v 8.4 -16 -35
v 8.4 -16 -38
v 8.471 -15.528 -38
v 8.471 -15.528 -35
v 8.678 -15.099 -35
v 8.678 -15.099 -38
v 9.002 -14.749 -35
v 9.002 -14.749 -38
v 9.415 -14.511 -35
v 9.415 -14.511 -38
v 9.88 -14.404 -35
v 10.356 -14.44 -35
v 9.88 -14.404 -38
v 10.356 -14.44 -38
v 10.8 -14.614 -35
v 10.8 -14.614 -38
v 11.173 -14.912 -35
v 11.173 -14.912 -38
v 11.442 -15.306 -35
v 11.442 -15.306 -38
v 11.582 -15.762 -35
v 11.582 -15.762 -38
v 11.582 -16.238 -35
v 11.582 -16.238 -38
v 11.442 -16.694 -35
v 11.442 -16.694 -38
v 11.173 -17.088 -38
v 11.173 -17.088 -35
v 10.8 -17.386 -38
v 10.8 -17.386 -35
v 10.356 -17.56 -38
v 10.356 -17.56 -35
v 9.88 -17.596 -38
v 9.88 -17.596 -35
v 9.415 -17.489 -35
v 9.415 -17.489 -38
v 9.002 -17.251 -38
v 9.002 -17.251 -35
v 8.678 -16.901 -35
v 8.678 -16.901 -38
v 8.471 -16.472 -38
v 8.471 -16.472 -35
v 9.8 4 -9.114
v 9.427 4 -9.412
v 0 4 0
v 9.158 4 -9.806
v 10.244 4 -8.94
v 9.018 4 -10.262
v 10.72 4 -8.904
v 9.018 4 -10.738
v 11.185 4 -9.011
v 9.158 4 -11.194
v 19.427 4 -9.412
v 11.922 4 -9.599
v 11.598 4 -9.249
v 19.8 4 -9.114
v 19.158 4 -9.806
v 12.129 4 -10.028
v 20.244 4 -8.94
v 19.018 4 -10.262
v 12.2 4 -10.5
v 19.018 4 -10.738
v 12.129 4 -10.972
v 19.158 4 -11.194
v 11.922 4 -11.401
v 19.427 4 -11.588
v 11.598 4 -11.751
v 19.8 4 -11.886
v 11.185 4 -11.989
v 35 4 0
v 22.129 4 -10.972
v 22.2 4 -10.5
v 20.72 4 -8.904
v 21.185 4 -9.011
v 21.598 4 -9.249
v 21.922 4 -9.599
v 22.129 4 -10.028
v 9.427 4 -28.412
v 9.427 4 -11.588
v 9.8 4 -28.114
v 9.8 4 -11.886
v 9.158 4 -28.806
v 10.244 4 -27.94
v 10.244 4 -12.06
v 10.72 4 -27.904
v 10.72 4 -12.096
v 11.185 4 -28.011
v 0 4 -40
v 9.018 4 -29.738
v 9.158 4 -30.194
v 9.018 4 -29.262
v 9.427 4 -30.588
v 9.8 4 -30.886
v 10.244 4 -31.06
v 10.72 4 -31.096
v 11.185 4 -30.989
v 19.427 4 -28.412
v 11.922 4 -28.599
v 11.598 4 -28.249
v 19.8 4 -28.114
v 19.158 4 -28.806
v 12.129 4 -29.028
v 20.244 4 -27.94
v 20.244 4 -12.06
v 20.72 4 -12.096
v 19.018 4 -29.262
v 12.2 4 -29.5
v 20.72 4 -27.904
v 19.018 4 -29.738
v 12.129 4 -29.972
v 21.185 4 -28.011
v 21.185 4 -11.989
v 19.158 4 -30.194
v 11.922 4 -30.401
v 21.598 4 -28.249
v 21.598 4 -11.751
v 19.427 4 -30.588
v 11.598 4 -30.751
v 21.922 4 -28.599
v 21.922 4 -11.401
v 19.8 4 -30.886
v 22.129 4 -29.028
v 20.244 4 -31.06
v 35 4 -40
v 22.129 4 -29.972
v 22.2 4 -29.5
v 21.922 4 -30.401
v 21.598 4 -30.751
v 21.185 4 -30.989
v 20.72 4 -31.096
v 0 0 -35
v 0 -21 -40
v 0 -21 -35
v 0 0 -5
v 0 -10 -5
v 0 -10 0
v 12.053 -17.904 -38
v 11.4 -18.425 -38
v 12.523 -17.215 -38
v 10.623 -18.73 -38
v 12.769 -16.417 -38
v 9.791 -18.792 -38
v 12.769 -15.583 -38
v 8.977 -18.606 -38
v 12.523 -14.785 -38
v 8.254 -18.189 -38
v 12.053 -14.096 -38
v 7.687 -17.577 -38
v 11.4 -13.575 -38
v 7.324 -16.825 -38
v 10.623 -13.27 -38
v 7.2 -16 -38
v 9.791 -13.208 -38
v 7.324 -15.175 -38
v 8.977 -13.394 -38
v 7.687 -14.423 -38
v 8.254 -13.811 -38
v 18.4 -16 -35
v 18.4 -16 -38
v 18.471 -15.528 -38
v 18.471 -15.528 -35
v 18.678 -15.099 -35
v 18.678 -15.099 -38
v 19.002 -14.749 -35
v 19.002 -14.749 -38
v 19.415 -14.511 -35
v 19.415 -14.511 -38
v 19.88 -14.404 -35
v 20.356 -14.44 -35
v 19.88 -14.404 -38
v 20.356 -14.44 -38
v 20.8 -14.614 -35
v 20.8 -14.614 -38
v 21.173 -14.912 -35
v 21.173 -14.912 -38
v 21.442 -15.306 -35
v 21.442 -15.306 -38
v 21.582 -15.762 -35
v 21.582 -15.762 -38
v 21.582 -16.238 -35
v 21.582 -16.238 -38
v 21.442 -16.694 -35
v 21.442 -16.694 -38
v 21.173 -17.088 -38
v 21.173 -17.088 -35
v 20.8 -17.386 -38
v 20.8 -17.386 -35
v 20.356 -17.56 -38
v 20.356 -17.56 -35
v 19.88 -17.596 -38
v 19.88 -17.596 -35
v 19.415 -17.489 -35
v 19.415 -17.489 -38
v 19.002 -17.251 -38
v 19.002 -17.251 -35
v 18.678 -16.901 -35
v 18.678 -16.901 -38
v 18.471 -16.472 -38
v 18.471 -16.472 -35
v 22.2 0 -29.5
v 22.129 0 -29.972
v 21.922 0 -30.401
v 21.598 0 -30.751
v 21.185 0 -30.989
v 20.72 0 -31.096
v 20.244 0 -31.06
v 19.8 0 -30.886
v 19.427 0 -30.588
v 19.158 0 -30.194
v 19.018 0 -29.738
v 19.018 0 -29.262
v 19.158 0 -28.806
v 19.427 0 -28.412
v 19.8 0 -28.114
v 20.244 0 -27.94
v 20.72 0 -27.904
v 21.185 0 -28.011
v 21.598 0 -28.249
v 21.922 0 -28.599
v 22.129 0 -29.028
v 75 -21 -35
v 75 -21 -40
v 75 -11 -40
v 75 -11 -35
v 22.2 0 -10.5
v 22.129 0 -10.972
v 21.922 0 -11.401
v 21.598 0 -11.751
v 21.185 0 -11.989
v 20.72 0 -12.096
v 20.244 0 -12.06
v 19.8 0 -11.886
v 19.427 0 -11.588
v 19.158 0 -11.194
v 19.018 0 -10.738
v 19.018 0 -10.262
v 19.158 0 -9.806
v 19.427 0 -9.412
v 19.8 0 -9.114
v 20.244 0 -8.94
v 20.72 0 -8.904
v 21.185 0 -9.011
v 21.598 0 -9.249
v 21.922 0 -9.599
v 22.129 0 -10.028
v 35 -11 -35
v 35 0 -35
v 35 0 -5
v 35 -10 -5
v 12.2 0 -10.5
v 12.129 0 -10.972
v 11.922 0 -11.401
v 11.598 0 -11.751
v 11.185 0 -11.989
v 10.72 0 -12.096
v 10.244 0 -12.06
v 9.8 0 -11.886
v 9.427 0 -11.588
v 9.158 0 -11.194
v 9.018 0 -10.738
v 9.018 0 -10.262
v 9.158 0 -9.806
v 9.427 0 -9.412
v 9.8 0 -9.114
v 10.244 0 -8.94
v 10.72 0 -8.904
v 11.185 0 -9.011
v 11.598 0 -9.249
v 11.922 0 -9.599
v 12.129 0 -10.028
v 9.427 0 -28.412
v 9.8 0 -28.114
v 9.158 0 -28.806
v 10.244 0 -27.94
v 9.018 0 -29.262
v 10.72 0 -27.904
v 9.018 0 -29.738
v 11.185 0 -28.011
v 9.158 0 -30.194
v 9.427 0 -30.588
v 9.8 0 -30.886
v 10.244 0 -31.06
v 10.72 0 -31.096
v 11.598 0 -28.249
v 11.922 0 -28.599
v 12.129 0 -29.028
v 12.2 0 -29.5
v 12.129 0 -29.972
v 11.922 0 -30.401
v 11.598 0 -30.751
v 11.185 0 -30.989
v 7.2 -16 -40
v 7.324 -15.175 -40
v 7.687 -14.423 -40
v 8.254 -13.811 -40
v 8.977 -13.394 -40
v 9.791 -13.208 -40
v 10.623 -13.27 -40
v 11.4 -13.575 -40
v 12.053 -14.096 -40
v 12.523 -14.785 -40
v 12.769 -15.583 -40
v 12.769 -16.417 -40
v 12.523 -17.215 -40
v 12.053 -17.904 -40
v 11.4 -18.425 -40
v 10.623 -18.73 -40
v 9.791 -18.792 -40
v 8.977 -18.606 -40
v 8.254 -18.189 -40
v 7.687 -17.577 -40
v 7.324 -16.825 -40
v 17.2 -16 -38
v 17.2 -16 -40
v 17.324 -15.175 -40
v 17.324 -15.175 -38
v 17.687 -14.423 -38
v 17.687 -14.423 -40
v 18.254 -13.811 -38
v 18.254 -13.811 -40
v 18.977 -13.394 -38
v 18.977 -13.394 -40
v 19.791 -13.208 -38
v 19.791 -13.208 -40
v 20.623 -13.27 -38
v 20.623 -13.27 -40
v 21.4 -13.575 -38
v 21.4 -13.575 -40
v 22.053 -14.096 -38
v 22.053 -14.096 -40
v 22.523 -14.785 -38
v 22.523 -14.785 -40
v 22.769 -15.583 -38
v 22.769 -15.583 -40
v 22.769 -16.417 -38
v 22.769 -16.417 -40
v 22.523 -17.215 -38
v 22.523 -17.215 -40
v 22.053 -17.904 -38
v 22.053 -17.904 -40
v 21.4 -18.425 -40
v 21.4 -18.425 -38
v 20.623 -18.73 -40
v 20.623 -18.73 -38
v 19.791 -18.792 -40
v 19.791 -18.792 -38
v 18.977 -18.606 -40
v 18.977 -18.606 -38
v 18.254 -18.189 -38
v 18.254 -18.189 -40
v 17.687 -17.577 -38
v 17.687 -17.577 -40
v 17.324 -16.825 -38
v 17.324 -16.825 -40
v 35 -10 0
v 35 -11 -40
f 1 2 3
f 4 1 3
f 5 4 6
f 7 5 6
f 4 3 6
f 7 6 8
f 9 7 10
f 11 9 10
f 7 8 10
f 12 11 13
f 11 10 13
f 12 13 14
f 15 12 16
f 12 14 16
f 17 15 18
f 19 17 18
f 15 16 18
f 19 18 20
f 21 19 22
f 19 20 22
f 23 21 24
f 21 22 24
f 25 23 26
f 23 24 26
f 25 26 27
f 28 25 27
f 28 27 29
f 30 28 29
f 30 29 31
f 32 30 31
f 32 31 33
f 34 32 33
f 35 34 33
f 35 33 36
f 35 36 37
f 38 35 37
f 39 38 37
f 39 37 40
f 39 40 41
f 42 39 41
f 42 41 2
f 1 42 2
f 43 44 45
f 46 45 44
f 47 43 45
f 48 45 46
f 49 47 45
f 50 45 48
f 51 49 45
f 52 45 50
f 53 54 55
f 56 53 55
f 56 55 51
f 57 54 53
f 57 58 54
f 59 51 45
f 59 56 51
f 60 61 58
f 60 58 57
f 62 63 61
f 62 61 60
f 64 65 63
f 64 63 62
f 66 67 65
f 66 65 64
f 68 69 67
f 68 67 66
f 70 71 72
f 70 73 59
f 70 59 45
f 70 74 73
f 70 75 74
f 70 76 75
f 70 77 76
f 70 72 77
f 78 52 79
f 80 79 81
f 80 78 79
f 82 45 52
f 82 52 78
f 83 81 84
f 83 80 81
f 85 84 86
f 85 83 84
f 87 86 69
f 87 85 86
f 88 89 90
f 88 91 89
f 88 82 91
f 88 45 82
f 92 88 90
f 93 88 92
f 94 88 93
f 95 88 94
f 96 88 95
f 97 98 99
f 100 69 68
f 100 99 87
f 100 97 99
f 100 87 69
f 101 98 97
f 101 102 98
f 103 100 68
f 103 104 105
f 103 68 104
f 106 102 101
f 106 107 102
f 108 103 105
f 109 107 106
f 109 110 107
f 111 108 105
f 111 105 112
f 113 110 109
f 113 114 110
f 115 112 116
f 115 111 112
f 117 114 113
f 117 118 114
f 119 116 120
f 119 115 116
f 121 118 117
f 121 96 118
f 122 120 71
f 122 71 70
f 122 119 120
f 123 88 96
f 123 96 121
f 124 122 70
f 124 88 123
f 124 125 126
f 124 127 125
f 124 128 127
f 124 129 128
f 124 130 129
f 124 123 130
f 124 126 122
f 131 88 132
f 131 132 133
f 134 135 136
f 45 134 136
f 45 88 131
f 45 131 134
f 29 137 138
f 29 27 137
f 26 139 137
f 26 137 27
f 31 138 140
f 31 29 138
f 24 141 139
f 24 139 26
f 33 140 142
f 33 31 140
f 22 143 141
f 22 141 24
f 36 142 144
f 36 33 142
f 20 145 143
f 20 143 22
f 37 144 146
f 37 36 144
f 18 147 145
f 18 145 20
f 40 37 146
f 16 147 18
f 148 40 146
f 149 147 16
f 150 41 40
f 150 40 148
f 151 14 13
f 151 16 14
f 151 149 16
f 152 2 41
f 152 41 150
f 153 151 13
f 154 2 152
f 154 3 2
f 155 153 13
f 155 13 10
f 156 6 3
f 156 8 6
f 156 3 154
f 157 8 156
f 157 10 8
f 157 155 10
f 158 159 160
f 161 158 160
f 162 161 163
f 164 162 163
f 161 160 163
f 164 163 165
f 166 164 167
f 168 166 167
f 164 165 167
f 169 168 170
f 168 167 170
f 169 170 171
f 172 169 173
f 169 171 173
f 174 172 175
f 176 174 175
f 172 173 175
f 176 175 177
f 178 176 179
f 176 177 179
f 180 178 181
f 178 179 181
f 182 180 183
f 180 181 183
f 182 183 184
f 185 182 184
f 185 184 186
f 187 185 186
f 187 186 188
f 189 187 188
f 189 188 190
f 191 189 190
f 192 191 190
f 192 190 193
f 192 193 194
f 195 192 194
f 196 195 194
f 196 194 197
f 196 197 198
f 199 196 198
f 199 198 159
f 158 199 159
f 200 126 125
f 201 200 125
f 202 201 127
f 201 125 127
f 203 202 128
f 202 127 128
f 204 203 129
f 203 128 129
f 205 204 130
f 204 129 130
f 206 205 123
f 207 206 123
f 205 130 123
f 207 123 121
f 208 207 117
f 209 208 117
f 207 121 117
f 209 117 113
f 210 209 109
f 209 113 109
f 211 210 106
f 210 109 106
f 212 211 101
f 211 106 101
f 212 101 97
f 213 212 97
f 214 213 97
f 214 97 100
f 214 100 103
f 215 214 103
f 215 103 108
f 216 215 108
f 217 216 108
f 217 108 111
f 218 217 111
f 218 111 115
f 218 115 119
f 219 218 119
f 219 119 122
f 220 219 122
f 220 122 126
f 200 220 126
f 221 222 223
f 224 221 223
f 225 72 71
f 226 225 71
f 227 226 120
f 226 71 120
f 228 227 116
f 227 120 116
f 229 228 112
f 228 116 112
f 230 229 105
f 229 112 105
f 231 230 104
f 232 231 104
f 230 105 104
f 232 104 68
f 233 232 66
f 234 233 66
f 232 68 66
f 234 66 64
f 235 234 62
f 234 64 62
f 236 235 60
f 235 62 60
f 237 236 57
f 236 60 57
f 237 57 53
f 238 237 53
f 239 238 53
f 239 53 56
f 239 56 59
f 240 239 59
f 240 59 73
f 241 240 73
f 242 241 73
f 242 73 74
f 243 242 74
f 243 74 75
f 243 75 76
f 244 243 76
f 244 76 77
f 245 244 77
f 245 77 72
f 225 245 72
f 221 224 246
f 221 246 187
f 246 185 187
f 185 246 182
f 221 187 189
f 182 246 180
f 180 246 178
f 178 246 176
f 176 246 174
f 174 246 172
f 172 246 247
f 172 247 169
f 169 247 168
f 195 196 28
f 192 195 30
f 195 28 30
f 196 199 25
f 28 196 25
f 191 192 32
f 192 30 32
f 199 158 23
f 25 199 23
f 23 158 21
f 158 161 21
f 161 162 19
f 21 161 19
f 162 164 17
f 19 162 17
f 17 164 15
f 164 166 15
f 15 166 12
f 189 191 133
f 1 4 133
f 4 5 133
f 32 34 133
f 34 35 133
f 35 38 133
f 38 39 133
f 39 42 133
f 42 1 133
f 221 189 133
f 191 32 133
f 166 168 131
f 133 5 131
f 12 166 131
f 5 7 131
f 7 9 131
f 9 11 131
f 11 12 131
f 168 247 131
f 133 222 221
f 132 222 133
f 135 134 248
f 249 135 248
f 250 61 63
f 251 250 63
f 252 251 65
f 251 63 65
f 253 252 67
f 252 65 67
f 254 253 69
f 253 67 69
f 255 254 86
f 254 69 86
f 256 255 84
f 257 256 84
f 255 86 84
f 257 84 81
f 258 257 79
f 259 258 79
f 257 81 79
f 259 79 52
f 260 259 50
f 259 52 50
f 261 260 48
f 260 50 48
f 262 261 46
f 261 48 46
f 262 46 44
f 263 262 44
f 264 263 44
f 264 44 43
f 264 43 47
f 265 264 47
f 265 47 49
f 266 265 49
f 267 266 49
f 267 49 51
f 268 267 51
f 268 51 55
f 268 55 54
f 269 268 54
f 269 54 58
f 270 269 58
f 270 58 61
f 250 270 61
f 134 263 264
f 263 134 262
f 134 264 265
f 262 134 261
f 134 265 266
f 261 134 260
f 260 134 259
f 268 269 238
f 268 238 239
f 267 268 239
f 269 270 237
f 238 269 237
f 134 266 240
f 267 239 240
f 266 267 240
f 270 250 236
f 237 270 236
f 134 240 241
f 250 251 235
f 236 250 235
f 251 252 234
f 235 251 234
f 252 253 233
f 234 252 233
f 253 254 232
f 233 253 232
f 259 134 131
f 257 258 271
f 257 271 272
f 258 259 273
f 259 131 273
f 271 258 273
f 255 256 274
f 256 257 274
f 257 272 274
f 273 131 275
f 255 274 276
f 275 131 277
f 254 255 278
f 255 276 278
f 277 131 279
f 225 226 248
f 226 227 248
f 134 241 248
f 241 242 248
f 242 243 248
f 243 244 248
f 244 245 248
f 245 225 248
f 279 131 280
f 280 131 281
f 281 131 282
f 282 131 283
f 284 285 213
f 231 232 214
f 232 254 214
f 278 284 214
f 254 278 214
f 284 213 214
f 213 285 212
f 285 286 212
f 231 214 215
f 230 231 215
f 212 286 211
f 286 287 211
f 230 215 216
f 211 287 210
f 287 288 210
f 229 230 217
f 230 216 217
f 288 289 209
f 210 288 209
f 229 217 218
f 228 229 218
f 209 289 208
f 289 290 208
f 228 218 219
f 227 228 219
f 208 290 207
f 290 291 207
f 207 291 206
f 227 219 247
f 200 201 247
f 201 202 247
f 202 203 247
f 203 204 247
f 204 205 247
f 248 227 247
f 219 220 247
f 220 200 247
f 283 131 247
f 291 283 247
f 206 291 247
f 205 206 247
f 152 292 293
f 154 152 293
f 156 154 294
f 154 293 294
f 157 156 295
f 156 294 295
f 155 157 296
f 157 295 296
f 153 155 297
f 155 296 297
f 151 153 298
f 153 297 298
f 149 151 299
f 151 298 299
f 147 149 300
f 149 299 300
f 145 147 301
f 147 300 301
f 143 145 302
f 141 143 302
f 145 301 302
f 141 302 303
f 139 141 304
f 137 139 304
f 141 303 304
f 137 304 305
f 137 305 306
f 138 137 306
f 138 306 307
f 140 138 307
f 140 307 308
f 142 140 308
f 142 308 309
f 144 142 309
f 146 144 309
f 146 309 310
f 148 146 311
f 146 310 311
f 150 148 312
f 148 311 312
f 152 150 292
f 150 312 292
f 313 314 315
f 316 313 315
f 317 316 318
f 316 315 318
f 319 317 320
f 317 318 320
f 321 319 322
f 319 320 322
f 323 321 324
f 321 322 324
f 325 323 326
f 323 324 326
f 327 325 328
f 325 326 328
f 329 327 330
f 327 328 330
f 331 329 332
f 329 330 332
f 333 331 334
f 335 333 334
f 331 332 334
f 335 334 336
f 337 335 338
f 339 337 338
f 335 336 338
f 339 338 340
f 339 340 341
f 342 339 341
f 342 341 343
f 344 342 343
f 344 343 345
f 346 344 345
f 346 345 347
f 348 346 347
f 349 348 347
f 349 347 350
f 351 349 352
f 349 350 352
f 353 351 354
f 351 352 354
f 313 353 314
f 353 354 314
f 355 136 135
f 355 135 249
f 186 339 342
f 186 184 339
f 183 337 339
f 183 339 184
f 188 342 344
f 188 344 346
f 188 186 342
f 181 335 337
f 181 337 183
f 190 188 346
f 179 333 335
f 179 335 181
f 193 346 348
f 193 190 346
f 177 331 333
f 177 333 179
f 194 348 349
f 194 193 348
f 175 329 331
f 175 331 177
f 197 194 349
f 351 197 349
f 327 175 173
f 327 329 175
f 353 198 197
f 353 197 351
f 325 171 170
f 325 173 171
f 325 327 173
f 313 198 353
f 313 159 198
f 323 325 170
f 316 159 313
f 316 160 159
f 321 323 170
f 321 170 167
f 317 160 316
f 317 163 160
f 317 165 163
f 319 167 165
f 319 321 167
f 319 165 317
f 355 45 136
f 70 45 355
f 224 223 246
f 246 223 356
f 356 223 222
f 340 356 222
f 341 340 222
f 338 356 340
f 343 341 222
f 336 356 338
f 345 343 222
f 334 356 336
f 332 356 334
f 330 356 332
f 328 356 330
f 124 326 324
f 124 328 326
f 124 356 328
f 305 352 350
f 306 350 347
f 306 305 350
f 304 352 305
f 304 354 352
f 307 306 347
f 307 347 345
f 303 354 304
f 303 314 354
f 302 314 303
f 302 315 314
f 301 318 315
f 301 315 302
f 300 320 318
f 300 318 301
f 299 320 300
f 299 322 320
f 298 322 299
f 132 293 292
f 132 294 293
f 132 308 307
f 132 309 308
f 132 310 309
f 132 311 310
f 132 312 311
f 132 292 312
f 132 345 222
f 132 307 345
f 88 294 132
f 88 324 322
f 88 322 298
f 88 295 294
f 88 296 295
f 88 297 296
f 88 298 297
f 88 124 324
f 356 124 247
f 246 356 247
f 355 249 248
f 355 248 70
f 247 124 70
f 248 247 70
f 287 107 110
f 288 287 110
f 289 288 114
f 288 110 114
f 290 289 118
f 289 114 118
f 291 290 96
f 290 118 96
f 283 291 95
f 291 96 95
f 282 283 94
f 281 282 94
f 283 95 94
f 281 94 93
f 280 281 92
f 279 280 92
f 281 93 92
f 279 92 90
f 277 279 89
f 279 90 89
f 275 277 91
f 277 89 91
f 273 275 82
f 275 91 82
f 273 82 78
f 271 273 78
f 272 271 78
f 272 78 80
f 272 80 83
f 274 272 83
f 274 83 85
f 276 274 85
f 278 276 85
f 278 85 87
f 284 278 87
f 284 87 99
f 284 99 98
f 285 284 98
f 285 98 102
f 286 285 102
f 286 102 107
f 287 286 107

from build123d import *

# Parameters (mm, degrees)
SKETCH_1_W          = 35
SKETCH_1_H          = 40
EXTRUDE_1_DEPTH     = 4
SKETCH_2_R          = 1.6
CUT_EXTRUDE_1_DEPTH = 6
SKETCH_3_W          = 35
SKETCH_3_H          = 5
EXTRUDE_2_DEPTH     = 21
SKETCH_4_R          = 1.6
CUT_EXTRUDE_2_DEPTH = 15
SKETCH_5_R          = 2.8
CUT_EXTRUDE_3_DEPTH = 2
SKETCH_6_W          = 40
SKETCH_6_H          = 10
EXTRUDE_3_DEPTH     = 5
SKETCH_7_W          = 35
SKETCH_7_H          = 5
EXTRUDE_4_DEPTH     = 10


with BuildPart() as part:
    # 草图1 → 凸台-拉伸1 (new body)
    with BuildSketch(Plane(origin=(0, 0, 0), x_dir=(1, 0, 0), z_dir=(0, 1, 0))):
        with Locations((17.5, 20)):
            Rectangle(SKETCH_1_W, SKETCH_1_H)
    extrude(amount=EXTRUDE_1_DEPTH)

    # 草图2 → 切除-拉伸1 (cut)
    with BuildSketch(Plane(origin=(0, 4, 0), x_dir=(1, 0, 0), z_dir=(0, 1, 0))):
        with Locations((10.6, 29.5)):
            Circle(SKETCH_2_R)
        with Locations((20.6, 29.5)):
            Circle(SKETCH_2_R)
        with Locations((20.6, 10.5)):
            Circle(SKETCH_2_R)
        with Locations((10.6, 10.5)):
            Circle(SKETCH_2_R)
    extrude(amount=-CUT_EXTRUDE_1_DEPTH, mode=Mode.SUBTRACT)

    # 草图3 → 凸台-拉伸2 (add)
    with BuildSketch(Plane.XZ):
        with Locations((17.5, -37.5)):
            Rectangle(SKETCH_3_W, SKETCH_3_H)
    extrude(amount=EXTRUDE_2_DEPTH)

    # 草图4 → 切除-拉伸2 (cut)
    with BuildSketch(Plane(origin=(0, 0, -40), x_dir=(-1, 0, 0), z_dir=(0, 0, -1))):
        with Locations((-10, -16)):
            Circle(SKETCH_4_R)
        with Locations((-20, -16)):
            Circle(SKETCH_4_R)
    extrude(amount=-CUT_EXTRUDE_2_DEPTH, mode=Mode.SUBTRACT)

    # 草图5 → 切除-拉伸3 (cut)
    with BuildSketch(Plane(origin=(0, 0, -40), x_dir=(-1, 0, 0), z_dir=(0, 0, -1))):
        with Locations((-20, -16)):
            Circle(SKETCH_5_R)
        with Locations((-10, -16)):
            Circle(SKETCH_5_R)
    extrude(amount=-CUT_EXTRUDE_3_DEPTH, mode=Mode.SUBTRACT)

    # 草图6 → 凸台-拉伸3 (add)
    with BuildSketch(Plane(origin=(0, 0, -40), x_dir=(-1, 0, 0), z_dir=(0, 0, -1))):
        with Locations((-55, -16)):
            Rectangle(SKETCH_6_W, SKETCH_6_H)
    extrude(amount=-EXTRUDE_3_DEPTH)

    # 草图7 → 凸台-拉伸4 (add)
    with BuildSketch(Plane.XZ):
        with Locations((17.5, -2.5)):
            Rectangle(SKETCH_7_W, SKETCH_7_H)
    extrude(amount=EXTRUDE_4_DEPTH)


solid = part.part
